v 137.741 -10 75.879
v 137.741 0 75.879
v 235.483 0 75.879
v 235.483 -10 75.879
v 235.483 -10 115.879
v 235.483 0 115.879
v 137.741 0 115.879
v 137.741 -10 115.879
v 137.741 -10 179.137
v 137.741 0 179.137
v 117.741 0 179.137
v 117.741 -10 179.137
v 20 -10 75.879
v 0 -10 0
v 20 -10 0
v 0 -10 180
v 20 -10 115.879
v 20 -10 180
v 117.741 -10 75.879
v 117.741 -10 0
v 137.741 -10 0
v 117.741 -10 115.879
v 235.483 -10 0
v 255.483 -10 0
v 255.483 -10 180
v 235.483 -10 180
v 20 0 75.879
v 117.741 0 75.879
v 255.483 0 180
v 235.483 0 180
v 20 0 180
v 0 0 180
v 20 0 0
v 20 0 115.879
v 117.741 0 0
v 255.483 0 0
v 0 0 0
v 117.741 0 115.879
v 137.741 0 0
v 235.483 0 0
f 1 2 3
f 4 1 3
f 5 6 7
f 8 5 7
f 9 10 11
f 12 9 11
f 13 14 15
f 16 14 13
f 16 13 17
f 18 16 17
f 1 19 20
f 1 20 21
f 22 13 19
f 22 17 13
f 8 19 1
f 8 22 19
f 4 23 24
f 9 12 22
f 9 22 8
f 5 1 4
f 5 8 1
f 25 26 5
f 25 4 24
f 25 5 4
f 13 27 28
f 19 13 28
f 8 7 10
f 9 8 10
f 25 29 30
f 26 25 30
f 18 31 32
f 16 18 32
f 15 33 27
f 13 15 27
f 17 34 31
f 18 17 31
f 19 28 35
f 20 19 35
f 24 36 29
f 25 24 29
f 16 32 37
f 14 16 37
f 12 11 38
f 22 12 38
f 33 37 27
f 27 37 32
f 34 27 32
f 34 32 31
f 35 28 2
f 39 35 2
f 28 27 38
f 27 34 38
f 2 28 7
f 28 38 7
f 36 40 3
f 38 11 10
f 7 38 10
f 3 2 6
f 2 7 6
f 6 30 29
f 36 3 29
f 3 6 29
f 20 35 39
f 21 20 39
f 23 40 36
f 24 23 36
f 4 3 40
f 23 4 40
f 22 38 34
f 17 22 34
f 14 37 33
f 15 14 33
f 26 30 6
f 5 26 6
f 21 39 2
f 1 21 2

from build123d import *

# Parameters (mm, degrees)
F1_DEPTH = 10


with BuildPart() as f1:
    # F0 (on Front) → F1 (new body)
    with BuildSketch(Plane.XZ):
        Polygon((0, 90), (0, 0), (20, 0), (20, 30), (20, 75.879364), (117.741286, 75.879364), (117.741286, 0), (137.741286, 0), (137.741286, 75.879364), (235.482572, 75.879364), (235.482572, 30), (235.482572, 0), (255.482572, 0), (255.482572, 180), (235.482572, 180), (235.482572, 115.879364), (137.741286, 115.879364), (137.741286, 179.137096), (127.741286, 179.137096), (117.741286, 179.137096), (117.741286, 115.879364), (20, 115.879364), (20, 180), (0, 180), (0, 115.879364), align=None)
    extrude(amount=F1_DEPTH)


solid = f1.part
